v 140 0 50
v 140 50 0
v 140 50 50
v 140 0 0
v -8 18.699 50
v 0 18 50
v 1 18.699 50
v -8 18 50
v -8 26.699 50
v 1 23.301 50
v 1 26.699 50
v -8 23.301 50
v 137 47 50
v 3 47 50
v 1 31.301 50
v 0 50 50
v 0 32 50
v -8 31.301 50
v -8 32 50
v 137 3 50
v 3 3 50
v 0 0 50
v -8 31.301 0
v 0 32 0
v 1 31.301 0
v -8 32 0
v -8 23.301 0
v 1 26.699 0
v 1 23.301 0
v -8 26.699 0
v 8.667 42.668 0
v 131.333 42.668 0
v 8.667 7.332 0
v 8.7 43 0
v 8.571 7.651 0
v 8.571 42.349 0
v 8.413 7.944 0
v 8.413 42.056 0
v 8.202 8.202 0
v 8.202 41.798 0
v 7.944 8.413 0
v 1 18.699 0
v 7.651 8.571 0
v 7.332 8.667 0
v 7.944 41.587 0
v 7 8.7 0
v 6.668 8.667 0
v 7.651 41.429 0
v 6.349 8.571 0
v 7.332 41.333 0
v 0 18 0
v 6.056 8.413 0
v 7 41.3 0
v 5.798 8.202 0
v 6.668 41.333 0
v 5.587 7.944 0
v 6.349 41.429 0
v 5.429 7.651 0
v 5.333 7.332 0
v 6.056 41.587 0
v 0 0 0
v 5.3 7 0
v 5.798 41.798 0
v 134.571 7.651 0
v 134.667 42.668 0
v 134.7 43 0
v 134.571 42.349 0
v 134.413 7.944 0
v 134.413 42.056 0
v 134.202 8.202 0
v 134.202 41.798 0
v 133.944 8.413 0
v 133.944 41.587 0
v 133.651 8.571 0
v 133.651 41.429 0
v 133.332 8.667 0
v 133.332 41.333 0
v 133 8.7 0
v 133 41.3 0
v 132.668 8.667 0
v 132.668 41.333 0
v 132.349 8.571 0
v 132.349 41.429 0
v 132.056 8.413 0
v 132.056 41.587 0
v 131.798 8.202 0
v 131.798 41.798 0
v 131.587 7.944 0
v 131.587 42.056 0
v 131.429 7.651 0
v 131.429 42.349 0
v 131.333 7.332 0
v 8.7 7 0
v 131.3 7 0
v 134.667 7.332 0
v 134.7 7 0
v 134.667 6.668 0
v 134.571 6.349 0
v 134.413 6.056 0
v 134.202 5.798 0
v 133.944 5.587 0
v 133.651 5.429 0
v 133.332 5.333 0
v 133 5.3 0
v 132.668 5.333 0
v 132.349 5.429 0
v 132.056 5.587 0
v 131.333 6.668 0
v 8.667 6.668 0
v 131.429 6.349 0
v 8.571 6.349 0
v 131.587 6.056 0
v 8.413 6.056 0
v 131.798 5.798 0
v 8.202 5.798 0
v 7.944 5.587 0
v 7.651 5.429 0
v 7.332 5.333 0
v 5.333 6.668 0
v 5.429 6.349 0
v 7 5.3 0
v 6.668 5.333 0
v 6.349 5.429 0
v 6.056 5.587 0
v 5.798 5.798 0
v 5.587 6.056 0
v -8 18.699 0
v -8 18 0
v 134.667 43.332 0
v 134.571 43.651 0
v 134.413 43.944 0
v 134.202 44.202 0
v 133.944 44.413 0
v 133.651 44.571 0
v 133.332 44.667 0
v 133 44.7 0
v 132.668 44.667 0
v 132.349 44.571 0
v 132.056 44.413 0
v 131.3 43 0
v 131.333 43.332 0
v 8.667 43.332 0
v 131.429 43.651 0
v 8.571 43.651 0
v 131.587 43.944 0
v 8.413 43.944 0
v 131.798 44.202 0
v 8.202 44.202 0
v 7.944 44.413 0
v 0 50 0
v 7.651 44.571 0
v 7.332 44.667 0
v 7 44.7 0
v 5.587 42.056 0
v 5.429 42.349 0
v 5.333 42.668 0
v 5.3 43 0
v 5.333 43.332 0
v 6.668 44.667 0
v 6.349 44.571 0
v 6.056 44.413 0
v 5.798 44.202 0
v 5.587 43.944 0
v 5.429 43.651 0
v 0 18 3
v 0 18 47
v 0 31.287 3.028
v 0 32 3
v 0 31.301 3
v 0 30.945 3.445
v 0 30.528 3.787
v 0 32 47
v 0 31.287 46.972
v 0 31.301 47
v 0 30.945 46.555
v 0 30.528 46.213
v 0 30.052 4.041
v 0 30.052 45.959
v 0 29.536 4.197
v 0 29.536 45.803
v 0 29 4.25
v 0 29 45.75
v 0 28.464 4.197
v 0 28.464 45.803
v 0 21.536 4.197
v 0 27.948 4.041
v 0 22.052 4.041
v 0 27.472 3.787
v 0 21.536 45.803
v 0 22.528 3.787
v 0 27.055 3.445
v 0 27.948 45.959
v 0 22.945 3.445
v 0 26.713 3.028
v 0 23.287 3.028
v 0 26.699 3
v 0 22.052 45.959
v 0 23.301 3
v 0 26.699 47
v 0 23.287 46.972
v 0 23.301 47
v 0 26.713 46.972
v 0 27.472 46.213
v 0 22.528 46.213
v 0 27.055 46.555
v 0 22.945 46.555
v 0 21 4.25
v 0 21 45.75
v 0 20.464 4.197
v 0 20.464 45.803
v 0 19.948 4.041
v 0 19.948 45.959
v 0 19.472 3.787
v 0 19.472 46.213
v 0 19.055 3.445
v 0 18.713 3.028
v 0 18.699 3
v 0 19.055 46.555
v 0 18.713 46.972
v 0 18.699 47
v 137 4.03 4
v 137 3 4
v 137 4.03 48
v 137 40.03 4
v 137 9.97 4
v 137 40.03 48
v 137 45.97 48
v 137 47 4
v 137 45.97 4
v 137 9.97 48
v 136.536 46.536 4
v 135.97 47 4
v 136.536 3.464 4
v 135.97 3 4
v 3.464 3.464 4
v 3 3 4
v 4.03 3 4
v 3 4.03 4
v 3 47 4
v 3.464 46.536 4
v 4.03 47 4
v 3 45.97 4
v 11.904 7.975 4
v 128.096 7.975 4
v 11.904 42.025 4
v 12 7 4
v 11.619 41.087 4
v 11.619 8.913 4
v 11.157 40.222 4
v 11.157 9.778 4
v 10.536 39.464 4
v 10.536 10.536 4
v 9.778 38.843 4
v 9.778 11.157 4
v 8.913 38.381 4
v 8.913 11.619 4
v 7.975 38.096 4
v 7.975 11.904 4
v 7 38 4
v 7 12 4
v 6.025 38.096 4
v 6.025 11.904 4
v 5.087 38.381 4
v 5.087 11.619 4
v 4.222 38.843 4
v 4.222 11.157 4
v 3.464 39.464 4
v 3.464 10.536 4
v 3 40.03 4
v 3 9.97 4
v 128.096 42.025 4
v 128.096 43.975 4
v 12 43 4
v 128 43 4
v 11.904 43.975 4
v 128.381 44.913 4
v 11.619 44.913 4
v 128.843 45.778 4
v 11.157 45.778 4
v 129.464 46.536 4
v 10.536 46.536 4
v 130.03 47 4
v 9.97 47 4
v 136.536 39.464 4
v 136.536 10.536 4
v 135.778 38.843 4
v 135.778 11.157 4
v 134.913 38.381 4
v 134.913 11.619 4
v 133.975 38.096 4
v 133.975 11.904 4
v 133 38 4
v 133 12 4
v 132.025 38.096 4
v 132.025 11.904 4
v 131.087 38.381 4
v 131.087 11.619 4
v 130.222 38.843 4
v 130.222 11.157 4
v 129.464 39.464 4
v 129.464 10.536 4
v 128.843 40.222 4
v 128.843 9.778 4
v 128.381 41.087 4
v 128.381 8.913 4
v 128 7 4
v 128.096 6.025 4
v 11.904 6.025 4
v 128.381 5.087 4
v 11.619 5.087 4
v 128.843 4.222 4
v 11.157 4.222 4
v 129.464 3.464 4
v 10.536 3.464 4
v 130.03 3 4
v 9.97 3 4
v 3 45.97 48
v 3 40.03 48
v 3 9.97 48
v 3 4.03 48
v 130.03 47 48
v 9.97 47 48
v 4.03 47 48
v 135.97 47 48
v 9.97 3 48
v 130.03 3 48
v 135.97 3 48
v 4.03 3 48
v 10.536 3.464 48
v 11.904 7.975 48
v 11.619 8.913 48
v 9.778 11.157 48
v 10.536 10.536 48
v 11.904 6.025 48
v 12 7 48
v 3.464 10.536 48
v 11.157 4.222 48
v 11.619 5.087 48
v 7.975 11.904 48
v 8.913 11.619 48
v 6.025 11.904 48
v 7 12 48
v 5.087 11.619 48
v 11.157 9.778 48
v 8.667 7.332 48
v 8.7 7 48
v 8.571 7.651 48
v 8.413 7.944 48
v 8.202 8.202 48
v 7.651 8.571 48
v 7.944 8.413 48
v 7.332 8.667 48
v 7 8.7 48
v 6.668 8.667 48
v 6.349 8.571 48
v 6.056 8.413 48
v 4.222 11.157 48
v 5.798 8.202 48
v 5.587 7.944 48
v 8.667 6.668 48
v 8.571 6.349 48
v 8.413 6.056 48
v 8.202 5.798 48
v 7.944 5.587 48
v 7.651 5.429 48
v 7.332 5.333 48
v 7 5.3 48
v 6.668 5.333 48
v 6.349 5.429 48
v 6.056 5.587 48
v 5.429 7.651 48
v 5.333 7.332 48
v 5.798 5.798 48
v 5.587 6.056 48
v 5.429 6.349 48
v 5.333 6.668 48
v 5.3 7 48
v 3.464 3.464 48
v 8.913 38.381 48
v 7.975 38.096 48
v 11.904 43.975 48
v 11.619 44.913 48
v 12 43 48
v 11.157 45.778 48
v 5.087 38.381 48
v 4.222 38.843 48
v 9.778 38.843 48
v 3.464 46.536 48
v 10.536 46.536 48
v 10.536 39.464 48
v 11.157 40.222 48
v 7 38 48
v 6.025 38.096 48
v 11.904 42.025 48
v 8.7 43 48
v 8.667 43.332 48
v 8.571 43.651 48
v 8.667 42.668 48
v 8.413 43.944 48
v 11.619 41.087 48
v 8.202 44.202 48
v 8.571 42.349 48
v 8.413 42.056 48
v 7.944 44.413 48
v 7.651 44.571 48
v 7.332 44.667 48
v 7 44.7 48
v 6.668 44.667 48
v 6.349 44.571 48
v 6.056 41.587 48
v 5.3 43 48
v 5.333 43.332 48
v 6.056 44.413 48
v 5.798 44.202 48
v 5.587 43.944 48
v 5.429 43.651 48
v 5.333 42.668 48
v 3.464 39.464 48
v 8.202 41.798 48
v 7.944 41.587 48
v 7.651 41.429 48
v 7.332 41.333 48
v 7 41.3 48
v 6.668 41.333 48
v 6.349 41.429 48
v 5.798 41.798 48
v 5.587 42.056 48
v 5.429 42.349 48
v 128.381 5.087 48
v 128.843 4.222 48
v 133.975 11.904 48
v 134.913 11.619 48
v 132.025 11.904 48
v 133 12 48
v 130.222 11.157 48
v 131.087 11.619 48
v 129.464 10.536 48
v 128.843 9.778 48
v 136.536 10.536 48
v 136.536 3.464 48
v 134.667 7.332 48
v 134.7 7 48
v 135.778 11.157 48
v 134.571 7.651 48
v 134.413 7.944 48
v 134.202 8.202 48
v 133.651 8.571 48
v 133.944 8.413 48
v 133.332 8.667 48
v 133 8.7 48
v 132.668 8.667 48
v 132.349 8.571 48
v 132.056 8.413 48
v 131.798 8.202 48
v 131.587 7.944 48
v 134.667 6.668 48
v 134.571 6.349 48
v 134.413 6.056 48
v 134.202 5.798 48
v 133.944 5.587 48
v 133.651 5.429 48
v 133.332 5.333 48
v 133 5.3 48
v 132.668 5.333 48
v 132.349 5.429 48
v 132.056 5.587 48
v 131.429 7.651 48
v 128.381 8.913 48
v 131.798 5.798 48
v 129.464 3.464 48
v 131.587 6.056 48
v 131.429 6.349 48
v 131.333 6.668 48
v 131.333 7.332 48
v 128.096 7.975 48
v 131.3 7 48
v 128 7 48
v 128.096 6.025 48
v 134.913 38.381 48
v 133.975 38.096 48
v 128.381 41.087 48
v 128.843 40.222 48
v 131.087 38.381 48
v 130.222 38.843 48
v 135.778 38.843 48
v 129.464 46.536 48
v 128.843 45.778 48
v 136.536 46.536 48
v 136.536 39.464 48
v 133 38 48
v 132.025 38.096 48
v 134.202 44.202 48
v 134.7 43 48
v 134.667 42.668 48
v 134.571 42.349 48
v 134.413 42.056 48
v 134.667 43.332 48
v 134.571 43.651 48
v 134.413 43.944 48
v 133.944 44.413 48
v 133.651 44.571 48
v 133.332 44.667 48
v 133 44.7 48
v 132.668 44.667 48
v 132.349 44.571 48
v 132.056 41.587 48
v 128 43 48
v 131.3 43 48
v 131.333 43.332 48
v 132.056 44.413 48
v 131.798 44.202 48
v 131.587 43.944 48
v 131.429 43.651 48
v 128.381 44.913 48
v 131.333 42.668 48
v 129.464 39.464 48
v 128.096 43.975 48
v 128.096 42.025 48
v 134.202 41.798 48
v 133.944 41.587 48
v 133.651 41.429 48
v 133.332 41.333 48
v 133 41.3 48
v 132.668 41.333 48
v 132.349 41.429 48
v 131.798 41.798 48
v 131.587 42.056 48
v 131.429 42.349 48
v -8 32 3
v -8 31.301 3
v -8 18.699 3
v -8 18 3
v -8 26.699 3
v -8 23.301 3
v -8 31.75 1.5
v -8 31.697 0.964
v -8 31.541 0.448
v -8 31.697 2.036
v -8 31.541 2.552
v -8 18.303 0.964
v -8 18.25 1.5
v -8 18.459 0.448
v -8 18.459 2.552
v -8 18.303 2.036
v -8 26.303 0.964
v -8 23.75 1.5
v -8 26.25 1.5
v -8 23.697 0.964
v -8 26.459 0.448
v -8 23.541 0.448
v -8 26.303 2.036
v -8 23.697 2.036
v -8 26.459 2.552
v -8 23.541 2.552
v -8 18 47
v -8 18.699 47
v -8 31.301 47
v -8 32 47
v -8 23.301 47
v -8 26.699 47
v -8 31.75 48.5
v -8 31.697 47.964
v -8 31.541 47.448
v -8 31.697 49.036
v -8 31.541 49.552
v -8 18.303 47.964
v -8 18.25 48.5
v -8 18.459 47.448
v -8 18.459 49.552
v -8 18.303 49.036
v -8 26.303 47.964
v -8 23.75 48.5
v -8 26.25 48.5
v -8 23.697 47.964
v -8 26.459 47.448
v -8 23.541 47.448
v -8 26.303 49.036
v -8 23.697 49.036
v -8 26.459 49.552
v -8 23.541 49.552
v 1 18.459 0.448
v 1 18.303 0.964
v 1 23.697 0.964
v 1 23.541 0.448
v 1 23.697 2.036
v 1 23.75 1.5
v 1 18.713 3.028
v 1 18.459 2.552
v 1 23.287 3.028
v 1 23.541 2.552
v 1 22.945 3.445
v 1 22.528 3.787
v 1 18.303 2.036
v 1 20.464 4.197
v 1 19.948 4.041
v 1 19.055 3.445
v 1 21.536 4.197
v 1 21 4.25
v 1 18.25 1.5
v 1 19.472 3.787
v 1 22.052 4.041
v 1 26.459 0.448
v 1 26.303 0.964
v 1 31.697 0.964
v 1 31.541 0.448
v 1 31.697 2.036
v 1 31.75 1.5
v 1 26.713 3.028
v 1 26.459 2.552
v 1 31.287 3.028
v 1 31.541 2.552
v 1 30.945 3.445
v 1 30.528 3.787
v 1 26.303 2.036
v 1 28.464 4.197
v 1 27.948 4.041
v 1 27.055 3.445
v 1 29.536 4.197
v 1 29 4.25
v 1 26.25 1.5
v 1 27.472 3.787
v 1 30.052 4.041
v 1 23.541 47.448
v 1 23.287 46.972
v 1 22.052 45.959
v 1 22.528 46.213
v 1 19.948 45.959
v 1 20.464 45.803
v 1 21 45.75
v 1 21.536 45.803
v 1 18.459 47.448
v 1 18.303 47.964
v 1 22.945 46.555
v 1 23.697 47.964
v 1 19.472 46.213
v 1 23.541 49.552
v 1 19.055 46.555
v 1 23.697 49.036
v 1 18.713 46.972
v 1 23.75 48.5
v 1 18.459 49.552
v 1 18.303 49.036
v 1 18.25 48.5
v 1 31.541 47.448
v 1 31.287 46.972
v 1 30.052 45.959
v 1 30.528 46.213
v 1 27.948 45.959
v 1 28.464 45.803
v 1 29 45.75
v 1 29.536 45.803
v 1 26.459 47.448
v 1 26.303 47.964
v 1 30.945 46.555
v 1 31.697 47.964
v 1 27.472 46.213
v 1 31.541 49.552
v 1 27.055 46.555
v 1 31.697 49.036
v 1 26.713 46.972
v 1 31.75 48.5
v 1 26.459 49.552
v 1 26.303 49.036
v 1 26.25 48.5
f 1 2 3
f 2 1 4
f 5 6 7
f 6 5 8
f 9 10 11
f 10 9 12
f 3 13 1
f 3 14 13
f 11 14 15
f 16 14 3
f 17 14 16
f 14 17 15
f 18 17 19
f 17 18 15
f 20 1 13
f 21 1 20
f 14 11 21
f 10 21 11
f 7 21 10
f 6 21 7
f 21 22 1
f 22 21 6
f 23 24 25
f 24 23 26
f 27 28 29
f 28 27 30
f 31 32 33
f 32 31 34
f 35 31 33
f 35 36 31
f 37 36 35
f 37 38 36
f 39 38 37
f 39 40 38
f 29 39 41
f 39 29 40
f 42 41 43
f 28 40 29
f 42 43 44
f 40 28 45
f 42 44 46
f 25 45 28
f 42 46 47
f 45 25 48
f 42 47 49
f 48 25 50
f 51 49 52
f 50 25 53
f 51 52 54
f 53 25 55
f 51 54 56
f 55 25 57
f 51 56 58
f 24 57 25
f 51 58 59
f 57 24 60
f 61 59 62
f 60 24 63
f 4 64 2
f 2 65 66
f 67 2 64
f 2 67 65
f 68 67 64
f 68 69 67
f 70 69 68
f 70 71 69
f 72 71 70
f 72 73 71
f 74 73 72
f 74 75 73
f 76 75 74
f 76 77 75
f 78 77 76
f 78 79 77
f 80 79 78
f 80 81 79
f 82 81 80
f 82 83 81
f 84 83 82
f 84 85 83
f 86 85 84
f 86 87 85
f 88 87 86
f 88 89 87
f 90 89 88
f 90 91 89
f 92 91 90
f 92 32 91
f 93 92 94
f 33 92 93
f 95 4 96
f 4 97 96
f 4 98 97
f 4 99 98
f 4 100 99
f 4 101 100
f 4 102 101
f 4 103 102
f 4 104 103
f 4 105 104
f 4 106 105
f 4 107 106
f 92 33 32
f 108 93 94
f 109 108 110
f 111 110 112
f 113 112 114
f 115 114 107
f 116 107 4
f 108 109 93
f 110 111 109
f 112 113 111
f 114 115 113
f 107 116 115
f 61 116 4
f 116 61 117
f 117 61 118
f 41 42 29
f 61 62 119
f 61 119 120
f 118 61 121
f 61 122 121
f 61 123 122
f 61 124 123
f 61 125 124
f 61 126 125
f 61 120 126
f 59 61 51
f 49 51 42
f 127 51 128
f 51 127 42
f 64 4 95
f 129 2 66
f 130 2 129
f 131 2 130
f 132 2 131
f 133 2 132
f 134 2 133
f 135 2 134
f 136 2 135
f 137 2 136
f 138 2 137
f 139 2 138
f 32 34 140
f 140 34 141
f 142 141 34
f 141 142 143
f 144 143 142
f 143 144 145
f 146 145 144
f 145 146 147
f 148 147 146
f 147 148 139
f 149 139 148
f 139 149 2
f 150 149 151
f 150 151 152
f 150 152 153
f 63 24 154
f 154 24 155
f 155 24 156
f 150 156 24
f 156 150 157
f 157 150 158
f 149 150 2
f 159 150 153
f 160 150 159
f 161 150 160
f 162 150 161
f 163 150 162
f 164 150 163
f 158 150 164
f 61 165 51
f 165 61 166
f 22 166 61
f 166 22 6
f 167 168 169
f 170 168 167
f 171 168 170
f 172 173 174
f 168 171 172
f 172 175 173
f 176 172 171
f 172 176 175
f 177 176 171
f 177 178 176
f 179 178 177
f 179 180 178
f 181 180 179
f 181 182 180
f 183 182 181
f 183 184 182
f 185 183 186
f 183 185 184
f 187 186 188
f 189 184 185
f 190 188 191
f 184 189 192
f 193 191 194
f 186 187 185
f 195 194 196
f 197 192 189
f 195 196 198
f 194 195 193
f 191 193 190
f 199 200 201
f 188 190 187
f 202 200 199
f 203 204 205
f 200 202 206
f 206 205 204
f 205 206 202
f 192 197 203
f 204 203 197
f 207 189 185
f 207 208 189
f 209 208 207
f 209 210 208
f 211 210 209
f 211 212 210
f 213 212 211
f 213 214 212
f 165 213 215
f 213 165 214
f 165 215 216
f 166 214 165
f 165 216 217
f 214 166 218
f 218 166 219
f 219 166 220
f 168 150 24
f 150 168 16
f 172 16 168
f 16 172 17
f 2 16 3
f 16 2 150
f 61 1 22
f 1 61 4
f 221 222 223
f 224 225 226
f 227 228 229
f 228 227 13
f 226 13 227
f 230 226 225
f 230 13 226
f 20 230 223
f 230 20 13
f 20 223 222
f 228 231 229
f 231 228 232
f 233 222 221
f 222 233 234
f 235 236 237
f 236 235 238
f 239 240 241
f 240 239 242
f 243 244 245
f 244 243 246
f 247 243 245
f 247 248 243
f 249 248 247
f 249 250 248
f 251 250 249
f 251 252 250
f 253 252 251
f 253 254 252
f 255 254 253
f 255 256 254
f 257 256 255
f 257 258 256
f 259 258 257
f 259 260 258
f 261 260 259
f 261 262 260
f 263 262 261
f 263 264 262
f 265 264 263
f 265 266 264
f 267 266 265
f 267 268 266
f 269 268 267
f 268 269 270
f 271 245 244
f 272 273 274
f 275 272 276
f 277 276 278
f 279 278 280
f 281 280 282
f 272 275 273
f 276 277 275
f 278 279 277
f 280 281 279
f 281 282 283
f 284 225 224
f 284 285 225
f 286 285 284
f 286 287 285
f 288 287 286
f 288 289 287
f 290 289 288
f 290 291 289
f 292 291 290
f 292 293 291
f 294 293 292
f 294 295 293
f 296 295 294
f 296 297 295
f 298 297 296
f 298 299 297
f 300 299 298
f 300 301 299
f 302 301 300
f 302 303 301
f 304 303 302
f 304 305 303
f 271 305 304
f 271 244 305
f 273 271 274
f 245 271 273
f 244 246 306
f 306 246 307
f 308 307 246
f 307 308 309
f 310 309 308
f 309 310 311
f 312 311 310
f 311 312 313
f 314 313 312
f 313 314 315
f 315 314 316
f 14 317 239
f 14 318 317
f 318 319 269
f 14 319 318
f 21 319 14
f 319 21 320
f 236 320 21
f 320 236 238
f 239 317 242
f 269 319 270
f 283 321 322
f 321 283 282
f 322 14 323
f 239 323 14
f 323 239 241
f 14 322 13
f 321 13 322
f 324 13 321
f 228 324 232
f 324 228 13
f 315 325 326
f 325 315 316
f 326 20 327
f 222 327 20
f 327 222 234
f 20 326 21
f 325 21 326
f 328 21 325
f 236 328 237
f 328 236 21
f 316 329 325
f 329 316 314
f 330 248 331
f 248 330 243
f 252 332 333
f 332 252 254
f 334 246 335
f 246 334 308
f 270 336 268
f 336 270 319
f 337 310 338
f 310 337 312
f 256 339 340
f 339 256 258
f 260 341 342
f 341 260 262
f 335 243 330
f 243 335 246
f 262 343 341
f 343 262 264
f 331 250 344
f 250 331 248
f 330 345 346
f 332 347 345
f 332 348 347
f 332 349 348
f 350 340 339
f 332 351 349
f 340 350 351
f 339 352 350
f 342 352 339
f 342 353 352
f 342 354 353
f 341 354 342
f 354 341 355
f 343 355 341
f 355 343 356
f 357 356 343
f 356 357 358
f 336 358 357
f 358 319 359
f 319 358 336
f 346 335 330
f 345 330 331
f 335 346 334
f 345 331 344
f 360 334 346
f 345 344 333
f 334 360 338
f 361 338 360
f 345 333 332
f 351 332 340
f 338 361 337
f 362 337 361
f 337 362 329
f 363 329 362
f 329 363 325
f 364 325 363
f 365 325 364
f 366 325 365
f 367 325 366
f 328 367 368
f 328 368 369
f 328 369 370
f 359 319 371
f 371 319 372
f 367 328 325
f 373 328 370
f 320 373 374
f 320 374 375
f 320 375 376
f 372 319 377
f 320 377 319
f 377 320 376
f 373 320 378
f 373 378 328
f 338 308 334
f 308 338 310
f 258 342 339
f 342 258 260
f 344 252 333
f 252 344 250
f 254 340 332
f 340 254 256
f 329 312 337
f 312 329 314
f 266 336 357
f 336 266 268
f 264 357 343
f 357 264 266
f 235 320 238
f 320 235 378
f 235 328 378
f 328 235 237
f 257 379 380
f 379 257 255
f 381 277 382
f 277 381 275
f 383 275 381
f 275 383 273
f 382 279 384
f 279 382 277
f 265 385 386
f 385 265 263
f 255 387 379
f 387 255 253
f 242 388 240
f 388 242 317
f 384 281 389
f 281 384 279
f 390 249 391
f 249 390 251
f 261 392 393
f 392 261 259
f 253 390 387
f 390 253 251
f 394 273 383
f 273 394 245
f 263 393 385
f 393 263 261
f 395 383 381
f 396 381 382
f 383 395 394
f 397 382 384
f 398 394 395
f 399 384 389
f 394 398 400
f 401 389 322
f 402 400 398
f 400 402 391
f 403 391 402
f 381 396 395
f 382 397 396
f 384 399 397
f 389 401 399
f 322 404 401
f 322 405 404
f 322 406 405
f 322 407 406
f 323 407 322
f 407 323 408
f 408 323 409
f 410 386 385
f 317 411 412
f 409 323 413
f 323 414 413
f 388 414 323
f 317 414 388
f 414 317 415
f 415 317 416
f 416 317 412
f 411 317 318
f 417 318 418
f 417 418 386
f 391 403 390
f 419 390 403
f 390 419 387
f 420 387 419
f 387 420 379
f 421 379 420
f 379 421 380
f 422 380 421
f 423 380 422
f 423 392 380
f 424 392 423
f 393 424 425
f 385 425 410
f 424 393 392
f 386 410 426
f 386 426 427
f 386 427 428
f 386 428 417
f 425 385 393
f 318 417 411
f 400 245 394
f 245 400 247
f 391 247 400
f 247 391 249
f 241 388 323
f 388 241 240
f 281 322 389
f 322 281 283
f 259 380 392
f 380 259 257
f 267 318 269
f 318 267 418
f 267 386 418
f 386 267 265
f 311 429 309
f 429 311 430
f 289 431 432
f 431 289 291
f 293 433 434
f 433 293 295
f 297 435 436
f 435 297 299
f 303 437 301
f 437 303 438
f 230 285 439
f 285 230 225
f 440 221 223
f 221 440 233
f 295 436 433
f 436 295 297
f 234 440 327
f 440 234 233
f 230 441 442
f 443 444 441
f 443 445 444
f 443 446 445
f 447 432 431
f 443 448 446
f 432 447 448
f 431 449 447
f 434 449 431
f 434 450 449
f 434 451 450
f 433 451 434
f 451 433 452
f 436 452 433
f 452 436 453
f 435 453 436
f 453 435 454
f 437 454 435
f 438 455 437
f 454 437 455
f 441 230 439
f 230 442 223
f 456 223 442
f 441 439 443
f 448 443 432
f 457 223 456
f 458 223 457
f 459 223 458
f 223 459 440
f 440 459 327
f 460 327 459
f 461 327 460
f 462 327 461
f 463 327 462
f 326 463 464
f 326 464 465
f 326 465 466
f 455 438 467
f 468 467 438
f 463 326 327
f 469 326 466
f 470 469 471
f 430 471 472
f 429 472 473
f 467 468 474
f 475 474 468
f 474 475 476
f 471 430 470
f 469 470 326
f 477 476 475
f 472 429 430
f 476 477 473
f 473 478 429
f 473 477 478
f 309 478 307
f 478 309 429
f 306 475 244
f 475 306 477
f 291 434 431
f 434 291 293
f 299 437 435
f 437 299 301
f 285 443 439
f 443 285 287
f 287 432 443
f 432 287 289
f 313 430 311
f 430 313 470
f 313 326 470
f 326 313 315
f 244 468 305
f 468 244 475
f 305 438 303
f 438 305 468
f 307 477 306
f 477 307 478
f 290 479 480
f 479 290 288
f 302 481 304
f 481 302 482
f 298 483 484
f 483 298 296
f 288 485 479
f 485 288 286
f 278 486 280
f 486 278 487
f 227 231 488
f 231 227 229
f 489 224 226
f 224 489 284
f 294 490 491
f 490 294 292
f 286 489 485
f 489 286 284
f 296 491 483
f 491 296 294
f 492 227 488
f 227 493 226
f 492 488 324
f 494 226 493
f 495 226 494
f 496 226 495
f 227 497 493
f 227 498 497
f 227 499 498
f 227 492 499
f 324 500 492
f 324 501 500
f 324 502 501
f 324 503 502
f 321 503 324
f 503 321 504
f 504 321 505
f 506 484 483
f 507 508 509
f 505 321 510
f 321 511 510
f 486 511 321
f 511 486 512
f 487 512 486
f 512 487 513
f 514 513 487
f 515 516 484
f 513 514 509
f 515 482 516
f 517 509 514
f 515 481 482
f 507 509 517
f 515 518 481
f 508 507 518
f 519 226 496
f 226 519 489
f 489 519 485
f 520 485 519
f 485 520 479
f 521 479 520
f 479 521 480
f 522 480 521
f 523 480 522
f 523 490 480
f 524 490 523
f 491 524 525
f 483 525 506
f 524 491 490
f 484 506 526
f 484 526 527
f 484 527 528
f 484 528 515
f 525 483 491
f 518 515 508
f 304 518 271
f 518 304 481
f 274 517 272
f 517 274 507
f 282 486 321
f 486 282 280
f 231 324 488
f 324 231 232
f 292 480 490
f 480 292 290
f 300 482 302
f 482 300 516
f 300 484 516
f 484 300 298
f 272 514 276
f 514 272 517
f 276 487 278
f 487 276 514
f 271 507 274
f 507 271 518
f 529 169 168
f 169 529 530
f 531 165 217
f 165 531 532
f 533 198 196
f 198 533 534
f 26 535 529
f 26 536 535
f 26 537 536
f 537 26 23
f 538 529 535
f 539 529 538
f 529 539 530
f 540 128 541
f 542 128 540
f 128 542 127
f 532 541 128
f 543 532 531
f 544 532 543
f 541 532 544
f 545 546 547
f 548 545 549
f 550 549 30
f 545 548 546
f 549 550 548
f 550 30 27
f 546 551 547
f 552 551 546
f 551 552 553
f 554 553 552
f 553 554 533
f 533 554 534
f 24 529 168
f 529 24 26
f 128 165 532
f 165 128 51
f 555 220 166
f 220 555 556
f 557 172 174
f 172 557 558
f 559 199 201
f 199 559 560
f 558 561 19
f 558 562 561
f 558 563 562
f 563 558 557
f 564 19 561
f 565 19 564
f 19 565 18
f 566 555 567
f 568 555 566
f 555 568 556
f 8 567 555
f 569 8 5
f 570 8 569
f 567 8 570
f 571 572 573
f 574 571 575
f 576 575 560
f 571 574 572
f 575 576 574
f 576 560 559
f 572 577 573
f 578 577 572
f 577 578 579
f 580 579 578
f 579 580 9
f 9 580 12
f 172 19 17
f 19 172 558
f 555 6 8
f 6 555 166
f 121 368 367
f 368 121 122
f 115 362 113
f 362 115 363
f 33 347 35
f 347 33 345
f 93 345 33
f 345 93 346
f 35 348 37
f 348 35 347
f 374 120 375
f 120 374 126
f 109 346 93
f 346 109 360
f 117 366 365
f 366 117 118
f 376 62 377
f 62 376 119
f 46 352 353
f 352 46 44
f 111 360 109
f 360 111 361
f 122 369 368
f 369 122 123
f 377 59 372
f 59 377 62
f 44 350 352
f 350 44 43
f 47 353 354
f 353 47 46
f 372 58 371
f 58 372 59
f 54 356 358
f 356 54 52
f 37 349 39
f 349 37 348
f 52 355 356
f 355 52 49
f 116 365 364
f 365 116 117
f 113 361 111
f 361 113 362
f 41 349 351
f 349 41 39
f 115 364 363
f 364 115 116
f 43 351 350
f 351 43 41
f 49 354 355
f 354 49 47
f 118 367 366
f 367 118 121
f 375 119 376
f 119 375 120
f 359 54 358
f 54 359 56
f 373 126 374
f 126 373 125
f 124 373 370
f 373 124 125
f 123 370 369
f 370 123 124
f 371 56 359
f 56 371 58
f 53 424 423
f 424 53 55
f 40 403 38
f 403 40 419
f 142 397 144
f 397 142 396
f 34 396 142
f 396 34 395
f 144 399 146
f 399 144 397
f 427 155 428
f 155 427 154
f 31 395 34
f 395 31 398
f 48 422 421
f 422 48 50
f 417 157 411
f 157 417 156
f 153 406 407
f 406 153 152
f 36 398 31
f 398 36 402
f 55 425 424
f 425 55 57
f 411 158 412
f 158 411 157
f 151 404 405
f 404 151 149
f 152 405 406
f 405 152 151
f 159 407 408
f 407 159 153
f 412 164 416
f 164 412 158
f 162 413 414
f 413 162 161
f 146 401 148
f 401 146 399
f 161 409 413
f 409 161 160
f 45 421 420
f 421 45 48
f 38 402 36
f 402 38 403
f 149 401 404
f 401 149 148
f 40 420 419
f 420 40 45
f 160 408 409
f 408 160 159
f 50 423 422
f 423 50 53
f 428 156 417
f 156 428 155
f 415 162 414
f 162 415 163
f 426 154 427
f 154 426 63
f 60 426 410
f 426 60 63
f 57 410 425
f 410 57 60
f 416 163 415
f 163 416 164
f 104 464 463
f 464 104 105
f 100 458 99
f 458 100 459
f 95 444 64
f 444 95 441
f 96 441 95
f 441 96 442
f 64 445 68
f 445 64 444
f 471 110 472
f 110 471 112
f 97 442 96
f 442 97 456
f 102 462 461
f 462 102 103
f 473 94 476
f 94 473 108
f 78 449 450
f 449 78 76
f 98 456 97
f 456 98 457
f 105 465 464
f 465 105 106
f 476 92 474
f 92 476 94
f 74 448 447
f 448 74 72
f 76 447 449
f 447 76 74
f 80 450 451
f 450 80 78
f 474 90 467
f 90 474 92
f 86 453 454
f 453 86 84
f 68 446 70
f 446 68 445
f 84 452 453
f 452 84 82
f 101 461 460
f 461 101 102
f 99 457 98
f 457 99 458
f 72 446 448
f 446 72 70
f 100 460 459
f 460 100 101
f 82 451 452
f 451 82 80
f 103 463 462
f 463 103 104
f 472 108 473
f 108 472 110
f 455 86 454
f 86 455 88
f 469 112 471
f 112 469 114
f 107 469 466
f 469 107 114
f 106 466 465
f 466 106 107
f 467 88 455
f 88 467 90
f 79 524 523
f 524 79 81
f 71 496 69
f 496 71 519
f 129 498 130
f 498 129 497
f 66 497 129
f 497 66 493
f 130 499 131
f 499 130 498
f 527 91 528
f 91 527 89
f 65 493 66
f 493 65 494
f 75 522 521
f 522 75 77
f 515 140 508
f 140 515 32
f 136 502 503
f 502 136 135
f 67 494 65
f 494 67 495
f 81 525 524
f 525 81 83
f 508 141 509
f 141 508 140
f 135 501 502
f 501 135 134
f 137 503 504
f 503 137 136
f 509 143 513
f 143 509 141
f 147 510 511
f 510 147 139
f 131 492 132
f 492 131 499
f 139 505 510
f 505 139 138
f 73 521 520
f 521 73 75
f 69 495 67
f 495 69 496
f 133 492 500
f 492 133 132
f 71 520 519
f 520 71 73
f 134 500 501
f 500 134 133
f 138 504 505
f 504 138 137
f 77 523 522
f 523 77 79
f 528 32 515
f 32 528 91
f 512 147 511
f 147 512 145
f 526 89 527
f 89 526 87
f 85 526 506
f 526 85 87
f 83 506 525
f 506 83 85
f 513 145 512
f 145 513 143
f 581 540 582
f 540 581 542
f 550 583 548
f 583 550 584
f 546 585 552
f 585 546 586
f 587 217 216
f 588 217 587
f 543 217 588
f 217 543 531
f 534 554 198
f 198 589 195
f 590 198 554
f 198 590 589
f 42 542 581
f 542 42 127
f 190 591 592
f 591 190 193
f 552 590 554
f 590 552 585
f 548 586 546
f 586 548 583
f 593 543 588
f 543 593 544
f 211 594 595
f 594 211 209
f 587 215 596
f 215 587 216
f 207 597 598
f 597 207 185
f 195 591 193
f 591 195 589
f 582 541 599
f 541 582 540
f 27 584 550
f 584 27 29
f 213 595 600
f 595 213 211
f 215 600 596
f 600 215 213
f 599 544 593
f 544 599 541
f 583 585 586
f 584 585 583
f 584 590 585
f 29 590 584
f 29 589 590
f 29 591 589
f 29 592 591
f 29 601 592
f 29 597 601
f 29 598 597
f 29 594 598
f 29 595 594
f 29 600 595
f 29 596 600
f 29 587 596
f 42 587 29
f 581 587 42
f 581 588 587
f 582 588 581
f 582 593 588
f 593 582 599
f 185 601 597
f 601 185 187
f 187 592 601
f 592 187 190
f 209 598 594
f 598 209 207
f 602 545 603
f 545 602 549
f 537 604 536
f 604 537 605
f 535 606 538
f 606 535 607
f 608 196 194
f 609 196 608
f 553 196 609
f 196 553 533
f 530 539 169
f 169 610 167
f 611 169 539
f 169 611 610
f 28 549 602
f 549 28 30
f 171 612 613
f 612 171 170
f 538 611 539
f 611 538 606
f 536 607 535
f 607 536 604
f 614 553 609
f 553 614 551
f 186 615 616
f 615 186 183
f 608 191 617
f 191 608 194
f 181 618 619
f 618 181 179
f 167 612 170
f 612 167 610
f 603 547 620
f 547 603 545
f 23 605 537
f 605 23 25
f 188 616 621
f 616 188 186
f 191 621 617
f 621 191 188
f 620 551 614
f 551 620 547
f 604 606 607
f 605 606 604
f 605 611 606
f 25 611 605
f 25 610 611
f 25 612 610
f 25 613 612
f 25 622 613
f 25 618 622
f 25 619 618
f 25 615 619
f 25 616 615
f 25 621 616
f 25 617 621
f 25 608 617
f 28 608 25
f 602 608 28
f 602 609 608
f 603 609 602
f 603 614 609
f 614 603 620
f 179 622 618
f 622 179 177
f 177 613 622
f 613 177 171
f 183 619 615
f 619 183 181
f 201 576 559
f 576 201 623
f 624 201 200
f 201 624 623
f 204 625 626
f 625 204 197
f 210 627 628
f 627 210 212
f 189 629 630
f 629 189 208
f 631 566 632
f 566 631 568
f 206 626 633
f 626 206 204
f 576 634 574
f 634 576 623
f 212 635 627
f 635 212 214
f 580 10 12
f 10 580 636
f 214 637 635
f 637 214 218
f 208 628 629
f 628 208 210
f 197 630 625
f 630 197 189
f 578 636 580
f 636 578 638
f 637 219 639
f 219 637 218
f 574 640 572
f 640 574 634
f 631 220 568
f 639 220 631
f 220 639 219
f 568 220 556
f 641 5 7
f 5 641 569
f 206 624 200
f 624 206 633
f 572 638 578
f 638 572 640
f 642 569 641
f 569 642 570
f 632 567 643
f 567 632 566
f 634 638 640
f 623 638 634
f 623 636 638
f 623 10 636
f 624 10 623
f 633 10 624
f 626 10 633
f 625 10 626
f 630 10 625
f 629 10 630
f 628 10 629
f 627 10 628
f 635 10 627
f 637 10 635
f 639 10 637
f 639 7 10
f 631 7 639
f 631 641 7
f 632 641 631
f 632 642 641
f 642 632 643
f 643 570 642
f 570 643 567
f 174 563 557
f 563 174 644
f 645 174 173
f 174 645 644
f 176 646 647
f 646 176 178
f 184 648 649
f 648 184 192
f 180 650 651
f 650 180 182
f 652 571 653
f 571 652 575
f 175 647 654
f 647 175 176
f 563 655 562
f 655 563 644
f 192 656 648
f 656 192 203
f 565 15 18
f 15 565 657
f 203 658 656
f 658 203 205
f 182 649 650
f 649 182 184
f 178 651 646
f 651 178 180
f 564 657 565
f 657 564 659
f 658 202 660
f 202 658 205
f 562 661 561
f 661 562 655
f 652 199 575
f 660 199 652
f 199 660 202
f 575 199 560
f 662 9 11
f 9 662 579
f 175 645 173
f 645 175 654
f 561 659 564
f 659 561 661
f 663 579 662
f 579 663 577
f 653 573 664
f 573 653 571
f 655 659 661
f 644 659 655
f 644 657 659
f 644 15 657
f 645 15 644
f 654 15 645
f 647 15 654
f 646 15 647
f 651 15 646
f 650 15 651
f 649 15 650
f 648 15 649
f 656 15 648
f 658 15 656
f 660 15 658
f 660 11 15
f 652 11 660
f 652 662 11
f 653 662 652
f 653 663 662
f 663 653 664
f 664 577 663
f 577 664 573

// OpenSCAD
$fn = 32;

// ----------------------------------------------------------------------
// Enclosure body: 140 x 50 x 50 mm, wall 3 mm
// ----------------------------------------------------------------------

// --- parameters (mm) ---
length = 140;             // outside length, X
width = 50;               // outside width, Y
height = 50;              // outside height, Z
wall = 3;                 // side wall thickness
floor_t = 4;              // floor thickness
boss_d = 10;              // corner boss diameter
boss_h = 44;              // corner boss height above the floor
boss_hole_d = 3.4;        // lid screw clearance in the boss
boss_lip = 7;             // boss centre inset from the corner
ear_w = 14;               // mounting ear width
ear_t = 3;                // mounting ear thickness
ear_ext = 8;              // mounting ear reach
ear_hole_d = 5.5;         // mounting ear drills

module shell() {
  difference() {
    cube([length, width, height]);
    /* hollow, open at the top */
    translate([wall, wall, floor_t])
      cube([length - 2 * wall, width - 2 * wall, height]);
  }
}

module bosses() {
  /* corner bosses, sunk 1 mm into the floor */
  for (sx = [0, 1]) for (sy = [0, 1])
    translate([sx * (length - 2 * boss_lip) + boss_lip, sy * (width - 2 * boss_lip) + boss_lip, floor_t - 1])
      cylinder(h = boss_h + 1, d = boss_d);
}

module ears() {
  /* mounting ears on the short walls, sunk into the wall */
  for (sz = [0, 1])
    translate([-ear_ext, width / 2 - ear_w / 2, sz * (height - ear_t)])
      cube([ear_ext + 2.5, ear_w, ear_t]);
}

difference() {
  union() {
    shell();
    bosses();
    ears();
  }
  /* boss screw holes */
  for (sx = [0, 1]) for (sy = [0, 1])
    translate([sx * (length - 2 * boss_lip) + boss_lip, sy * (width - 2 * boss_lip) + boss_lip, -1]) cylinder(h = floor_t + boss_h + 2, d = boss_hole_d);
  for (sz = [0, 1]) for (sx = [0, 1]) translate([-ear_ext - 1, width / 2 + (2 * sx - 1) * (ear_w / 2 - 3), sz * (height - ear_t) + ear_t / 2]) rotate([0, 90, 0]) cylinder(h = ear_ext + 2, d = ear_hole_d);
}
